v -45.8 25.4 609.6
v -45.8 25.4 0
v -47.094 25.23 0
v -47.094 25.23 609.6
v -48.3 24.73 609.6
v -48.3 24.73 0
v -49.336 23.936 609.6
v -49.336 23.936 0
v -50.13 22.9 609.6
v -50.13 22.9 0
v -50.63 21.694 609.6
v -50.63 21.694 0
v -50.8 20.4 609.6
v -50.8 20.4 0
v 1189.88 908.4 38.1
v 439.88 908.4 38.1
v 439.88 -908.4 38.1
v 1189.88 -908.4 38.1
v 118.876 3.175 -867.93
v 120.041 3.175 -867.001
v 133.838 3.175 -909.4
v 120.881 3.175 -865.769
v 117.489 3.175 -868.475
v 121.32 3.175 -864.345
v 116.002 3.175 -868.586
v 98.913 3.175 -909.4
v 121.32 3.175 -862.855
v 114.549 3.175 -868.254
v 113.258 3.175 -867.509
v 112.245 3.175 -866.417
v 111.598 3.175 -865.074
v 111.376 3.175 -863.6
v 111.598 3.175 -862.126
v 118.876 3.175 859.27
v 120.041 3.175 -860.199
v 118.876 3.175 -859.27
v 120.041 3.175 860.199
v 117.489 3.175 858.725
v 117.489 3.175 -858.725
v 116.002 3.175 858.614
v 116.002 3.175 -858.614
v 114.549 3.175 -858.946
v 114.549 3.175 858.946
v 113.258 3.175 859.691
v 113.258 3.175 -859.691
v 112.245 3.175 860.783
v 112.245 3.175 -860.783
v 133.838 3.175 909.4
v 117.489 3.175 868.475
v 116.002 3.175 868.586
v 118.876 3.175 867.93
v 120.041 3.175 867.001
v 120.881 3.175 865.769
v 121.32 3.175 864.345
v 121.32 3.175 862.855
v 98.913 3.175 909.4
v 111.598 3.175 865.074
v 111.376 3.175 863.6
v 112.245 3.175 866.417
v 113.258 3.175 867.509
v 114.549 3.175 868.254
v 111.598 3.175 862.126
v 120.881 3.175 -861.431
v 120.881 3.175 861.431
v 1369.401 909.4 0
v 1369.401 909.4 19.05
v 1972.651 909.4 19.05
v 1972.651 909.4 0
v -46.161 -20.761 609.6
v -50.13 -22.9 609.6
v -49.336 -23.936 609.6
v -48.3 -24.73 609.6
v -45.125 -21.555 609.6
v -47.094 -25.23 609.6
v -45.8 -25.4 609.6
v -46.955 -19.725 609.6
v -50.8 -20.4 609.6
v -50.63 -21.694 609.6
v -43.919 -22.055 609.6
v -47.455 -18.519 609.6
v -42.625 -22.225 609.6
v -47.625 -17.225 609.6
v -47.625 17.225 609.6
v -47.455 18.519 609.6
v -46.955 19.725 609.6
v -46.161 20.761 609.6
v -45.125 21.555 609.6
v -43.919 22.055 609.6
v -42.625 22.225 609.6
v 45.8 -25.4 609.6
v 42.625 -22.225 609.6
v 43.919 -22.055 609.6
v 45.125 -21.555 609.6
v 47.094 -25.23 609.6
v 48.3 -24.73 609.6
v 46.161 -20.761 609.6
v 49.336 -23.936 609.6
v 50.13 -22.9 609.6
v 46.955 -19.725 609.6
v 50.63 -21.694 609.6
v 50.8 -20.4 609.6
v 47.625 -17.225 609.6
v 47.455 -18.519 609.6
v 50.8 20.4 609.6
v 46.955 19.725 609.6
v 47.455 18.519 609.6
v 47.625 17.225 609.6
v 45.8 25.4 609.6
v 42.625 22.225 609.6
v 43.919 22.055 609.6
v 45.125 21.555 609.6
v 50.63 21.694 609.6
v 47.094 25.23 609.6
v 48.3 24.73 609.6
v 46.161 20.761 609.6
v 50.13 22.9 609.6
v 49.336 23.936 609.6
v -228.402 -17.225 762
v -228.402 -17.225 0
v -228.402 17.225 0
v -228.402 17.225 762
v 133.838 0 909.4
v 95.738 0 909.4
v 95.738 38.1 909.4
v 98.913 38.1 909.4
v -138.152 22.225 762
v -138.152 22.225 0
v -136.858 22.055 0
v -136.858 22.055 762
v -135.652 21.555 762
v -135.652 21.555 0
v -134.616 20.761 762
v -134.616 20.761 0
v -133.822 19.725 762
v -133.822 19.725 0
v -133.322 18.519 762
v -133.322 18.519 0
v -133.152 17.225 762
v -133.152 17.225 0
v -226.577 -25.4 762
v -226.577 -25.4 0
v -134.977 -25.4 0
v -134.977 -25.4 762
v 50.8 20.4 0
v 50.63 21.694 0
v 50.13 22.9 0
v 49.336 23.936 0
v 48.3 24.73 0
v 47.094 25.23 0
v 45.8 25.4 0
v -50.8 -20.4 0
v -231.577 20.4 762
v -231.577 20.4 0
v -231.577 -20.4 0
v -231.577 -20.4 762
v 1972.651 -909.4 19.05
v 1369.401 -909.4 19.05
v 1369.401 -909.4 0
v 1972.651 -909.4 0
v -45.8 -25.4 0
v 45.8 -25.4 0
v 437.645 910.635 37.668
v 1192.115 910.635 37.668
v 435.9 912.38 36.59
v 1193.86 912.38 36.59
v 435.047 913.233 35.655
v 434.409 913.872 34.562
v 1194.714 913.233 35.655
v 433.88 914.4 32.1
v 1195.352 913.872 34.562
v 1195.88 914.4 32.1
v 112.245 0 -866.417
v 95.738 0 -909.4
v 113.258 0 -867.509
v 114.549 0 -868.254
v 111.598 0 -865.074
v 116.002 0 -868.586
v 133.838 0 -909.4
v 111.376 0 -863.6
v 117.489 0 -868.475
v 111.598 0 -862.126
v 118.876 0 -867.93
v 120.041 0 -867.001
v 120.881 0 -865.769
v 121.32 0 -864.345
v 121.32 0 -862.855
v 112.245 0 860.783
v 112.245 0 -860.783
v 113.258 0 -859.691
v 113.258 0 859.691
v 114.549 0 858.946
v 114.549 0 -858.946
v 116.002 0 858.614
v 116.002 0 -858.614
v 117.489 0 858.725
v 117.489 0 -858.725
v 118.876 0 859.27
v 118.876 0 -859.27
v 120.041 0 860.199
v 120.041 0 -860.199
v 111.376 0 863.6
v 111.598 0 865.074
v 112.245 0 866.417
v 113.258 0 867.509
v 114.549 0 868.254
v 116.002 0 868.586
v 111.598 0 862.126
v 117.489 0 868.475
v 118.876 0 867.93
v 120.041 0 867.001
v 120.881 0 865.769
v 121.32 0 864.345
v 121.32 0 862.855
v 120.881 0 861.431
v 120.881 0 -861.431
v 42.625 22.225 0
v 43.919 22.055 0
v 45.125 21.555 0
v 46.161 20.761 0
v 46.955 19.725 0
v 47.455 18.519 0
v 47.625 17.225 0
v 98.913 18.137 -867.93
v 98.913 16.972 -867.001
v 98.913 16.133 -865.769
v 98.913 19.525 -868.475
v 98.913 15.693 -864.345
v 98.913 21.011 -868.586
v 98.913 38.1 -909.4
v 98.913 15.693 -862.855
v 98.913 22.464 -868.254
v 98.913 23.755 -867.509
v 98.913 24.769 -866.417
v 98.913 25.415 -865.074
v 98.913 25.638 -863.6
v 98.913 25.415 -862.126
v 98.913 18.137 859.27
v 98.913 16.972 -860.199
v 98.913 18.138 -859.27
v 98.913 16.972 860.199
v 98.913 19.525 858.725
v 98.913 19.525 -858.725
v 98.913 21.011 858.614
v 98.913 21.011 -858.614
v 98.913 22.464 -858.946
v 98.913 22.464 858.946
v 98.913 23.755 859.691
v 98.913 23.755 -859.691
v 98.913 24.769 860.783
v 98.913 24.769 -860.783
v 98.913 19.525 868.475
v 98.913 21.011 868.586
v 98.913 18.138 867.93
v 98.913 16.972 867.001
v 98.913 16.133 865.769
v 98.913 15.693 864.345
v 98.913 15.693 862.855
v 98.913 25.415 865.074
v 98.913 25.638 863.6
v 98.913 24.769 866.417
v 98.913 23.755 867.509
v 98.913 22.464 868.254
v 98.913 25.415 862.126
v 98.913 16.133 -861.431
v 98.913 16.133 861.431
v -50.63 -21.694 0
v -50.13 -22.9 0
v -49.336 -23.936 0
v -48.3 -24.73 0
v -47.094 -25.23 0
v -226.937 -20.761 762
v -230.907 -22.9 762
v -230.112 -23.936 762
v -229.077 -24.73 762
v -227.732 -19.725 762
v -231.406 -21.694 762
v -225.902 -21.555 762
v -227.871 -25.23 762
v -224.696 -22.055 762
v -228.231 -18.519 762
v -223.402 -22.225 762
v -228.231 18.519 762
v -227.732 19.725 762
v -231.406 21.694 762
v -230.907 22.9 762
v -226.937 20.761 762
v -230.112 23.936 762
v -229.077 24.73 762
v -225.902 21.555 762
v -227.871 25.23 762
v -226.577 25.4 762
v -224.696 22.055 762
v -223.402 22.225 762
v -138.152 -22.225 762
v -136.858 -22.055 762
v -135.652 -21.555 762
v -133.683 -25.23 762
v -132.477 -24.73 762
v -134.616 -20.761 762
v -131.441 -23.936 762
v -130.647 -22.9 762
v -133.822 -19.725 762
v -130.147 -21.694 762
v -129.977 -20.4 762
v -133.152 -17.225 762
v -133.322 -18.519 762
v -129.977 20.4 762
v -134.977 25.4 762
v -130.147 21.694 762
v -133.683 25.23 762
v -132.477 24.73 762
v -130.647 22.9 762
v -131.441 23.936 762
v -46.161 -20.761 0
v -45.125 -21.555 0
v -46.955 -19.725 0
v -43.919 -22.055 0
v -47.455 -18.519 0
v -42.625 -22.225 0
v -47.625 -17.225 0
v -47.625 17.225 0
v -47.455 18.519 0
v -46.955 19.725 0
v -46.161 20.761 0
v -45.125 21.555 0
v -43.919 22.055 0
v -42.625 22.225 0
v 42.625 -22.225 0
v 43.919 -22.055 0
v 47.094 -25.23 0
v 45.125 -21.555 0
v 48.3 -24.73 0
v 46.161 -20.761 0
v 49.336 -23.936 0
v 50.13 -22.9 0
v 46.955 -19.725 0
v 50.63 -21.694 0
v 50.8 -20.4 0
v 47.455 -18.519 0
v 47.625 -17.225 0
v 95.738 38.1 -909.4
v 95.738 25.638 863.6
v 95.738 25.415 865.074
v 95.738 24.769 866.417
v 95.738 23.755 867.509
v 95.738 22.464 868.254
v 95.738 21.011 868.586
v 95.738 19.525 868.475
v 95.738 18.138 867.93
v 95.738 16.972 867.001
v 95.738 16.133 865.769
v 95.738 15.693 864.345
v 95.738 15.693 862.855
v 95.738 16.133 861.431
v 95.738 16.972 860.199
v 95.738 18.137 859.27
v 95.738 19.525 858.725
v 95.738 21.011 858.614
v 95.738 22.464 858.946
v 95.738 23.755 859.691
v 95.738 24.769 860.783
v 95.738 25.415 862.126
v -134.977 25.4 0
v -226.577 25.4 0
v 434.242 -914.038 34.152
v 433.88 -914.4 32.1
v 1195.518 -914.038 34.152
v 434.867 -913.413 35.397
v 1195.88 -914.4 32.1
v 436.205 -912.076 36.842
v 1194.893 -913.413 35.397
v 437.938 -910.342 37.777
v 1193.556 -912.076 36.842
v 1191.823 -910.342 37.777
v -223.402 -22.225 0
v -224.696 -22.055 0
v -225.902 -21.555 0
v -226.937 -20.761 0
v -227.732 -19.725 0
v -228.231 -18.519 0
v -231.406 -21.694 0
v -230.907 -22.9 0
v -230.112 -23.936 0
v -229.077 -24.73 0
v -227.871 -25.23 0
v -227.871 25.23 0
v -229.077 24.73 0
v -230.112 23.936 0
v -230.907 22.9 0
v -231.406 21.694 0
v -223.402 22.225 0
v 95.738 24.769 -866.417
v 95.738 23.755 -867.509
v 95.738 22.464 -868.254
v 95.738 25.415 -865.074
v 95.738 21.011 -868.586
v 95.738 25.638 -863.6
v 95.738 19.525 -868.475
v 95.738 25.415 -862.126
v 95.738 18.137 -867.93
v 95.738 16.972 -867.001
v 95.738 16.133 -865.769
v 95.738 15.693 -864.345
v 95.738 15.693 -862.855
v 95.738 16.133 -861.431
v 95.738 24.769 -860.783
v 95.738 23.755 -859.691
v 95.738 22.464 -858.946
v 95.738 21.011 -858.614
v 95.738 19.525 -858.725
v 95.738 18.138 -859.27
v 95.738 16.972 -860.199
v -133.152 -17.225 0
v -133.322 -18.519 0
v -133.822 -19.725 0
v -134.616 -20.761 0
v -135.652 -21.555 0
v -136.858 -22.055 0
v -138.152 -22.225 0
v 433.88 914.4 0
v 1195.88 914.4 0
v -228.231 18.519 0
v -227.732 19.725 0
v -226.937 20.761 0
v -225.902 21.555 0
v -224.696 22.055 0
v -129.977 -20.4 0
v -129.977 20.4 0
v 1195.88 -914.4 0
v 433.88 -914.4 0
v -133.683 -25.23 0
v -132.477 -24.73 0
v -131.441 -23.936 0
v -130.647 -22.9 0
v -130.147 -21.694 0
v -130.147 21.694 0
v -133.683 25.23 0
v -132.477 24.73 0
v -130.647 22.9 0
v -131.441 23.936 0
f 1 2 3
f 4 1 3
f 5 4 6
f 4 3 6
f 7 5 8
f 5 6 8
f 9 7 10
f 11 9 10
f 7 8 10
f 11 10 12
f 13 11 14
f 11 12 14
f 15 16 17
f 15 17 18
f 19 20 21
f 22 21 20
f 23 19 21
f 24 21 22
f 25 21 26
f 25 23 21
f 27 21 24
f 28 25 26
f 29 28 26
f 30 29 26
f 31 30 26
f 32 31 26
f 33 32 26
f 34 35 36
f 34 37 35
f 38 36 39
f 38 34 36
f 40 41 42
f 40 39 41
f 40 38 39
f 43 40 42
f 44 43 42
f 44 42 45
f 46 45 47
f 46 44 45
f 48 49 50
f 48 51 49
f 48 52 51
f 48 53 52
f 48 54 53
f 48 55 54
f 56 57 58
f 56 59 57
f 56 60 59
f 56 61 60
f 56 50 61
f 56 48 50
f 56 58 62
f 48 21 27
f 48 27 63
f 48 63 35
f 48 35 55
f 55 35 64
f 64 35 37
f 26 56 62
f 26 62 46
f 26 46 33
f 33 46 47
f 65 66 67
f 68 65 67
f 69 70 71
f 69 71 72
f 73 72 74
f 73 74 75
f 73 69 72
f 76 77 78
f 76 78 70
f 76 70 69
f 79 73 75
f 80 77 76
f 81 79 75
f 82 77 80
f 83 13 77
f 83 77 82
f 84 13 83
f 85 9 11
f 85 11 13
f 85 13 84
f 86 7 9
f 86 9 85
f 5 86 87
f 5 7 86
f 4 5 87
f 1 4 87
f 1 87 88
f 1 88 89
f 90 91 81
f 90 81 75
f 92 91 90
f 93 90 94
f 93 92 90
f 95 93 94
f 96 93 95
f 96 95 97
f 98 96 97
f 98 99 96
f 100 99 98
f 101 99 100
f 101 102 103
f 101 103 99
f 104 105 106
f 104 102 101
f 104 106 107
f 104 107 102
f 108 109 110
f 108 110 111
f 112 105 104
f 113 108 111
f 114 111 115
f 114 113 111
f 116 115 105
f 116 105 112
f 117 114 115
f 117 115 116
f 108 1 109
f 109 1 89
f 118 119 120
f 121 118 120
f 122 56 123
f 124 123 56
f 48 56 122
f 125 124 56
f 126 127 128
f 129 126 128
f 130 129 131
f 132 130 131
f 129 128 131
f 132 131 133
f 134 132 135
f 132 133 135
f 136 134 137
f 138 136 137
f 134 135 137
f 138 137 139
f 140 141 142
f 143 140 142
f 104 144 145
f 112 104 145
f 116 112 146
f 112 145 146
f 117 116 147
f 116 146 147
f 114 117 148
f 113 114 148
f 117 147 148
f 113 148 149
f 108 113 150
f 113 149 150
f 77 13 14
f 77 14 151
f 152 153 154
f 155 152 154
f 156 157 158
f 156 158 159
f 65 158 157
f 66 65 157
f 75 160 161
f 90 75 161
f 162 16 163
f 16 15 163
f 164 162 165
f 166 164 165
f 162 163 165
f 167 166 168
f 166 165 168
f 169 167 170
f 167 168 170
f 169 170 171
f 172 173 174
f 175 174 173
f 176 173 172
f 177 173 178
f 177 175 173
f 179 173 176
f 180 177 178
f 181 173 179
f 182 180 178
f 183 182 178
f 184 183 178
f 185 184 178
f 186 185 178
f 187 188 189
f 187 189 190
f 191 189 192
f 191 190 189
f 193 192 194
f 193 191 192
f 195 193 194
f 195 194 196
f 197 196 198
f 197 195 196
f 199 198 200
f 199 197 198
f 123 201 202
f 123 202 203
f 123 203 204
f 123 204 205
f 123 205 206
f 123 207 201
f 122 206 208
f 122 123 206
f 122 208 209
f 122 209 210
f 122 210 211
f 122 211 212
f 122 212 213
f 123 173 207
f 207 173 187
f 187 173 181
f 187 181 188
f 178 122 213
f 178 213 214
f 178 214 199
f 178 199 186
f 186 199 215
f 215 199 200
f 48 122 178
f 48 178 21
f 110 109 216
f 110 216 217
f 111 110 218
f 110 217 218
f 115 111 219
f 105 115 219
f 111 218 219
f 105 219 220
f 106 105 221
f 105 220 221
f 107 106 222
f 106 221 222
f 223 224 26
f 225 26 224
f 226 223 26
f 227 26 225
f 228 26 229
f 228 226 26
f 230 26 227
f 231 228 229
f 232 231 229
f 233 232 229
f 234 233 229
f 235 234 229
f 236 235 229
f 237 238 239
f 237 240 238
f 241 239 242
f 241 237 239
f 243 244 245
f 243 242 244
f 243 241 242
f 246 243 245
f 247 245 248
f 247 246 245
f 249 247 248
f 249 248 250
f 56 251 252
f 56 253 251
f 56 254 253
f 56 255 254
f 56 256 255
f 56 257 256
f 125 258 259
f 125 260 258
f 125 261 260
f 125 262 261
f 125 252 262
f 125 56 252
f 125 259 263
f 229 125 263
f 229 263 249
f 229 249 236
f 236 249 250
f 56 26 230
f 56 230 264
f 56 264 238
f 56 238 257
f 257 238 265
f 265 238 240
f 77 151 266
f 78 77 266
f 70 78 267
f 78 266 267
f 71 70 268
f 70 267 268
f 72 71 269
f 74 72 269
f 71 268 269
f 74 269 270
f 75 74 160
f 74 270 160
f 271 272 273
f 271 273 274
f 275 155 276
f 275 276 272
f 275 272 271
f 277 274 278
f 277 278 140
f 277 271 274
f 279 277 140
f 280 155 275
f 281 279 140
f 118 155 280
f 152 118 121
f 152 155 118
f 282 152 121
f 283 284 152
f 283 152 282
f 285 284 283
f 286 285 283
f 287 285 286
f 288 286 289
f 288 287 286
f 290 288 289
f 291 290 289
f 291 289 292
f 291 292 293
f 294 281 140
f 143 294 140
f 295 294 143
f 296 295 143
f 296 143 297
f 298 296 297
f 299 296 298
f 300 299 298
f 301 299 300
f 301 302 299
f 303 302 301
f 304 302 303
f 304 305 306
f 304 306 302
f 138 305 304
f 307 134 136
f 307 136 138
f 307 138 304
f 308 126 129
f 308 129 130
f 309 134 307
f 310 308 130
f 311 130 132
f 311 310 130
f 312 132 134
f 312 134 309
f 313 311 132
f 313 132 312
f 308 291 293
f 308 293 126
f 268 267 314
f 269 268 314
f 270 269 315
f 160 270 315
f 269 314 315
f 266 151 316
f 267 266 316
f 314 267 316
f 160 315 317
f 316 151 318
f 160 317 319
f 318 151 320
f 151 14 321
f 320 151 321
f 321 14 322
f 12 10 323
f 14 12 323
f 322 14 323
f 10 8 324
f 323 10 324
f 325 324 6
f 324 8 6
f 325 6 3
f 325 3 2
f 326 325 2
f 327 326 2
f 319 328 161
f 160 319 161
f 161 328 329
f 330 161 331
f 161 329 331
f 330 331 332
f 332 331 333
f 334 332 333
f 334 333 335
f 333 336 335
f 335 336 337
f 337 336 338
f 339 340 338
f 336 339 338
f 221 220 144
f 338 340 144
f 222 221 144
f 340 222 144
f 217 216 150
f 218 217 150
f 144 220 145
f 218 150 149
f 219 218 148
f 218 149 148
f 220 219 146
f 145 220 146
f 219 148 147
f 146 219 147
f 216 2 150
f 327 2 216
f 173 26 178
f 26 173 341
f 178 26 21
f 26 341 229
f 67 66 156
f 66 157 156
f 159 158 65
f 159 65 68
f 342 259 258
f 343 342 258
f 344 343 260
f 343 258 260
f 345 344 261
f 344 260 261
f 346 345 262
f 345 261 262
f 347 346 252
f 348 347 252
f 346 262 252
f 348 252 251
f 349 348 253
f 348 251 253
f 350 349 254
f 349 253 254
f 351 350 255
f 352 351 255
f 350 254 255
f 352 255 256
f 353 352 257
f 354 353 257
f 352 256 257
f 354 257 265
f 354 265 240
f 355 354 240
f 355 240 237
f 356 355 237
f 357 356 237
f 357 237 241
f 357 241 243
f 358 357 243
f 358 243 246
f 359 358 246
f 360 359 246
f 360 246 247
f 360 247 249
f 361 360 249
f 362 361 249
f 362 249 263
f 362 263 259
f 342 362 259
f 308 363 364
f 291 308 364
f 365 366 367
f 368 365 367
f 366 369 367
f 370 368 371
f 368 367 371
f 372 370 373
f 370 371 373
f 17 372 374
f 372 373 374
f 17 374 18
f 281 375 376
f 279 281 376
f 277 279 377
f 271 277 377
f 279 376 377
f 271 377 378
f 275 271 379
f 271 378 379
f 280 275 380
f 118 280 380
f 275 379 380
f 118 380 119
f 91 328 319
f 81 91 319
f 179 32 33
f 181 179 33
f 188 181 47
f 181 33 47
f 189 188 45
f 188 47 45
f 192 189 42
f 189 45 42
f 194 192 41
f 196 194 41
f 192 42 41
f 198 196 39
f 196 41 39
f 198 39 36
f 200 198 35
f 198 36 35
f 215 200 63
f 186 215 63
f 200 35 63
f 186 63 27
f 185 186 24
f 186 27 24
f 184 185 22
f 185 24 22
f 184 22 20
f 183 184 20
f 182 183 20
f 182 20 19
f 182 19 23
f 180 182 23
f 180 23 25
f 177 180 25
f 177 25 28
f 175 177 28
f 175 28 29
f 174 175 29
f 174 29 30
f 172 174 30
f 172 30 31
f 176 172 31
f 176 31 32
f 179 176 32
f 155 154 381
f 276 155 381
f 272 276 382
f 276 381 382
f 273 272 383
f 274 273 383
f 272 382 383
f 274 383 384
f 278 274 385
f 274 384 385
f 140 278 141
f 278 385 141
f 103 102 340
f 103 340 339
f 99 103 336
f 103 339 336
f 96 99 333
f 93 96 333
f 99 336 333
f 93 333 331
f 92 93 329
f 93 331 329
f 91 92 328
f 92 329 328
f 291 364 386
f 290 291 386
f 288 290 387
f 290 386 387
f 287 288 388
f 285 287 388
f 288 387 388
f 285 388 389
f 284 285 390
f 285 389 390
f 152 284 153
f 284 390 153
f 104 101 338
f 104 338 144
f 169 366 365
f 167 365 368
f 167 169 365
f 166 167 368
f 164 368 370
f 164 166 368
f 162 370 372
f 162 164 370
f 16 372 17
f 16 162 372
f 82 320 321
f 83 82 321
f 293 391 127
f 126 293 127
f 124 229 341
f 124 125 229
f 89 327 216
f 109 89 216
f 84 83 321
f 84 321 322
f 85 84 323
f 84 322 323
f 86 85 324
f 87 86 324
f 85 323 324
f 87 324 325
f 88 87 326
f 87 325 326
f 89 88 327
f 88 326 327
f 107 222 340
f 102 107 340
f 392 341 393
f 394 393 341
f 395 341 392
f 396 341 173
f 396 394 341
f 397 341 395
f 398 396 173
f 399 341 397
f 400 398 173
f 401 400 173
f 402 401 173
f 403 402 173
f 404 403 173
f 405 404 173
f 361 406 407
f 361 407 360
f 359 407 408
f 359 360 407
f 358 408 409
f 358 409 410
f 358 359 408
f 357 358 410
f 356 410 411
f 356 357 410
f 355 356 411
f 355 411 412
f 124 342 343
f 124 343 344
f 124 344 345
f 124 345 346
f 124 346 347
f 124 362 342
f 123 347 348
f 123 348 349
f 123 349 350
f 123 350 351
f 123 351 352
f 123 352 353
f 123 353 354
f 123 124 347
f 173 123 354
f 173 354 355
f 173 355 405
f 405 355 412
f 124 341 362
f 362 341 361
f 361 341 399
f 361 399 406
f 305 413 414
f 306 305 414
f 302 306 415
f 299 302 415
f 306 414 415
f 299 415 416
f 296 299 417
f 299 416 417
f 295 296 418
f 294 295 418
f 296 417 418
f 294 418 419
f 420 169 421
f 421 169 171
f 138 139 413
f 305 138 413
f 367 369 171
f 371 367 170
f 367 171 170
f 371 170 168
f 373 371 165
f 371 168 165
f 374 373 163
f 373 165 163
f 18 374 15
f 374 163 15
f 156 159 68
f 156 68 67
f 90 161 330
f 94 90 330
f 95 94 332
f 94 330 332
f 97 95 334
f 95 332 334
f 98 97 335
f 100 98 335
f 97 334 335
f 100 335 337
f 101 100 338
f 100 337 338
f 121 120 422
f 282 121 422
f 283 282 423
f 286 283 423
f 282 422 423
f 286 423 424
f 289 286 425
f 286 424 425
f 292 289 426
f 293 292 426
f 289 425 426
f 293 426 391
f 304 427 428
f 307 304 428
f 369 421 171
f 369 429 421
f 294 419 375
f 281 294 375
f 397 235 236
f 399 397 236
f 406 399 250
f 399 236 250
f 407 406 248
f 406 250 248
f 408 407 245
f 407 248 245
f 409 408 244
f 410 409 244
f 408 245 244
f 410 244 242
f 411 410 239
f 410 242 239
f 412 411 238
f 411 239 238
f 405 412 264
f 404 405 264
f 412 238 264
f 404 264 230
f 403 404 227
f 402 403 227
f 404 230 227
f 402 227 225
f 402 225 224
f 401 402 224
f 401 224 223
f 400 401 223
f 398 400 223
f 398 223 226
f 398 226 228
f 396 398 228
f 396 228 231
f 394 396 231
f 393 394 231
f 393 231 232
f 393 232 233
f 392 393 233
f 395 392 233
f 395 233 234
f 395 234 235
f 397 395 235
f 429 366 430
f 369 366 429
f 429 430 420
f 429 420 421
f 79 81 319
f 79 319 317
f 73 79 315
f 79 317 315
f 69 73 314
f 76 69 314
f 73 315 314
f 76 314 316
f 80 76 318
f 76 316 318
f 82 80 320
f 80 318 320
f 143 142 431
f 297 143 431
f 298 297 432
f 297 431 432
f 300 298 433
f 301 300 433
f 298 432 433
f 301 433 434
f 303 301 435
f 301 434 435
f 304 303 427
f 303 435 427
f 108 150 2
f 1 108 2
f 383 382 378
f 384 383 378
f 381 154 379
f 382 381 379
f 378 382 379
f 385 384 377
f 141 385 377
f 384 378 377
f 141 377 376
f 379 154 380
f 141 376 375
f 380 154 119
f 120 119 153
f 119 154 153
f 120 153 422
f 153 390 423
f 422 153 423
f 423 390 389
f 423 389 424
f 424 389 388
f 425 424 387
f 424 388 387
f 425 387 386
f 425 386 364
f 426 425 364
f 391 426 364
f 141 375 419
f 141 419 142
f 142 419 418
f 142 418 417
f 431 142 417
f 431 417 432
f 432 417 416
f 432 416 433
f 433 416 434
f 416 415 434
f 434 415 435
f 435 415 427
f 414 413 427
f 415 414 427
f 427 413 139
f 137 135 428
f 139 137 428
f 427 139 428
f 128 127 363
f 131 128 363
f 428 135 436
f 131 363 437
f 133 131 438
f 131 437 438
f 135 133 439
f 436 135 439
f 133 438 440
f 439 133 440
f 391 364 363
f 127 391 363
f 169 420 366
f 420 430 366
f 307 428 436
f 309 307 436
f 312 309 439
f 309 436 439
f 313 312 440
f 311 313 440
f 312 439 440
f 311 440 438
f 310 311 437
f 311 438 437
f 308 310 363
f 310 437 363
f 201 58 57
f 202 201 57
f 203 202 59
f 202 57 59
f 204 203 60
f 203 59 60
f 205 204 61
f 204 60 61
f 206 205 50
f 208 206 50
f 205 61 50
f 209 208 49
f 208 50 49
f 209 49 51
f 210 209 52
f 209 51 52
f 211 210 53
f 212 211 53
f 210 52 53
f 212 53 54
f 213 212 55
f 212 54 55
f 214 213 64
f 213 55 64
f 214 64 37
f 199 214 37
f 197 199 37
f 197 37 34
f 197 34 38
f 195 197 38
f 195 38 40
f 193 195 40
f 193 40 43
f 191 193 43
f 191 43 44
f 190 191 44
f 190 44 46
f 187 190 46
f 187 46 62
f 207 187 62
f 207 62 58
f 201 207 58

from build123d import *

# Parameters (mm, degrees)
F1_DEPTH  = 762
F3_DEPTH  = 609.6
F5_DEPTH  = 909.4
F6_W      = 762
F6_H      = 38.1
F7_DEPTH  = 914.4
F8_R      = 6
F10_R     = 5
F11_DEPTH = 330.4912731061
F12_R     = 5
F13_DEPTH = 917.576
F9_W      = 603.25
F9_H      = 19.05
F14_DEPTH = 909.4


with BuildPart() as f1:
    # F0 (on Top) → F1 (new body)
    with BuildSketch(Plane.XY):
        with BuildLine():
            ThreePointArc((-129.9768344879, 20.4), (-131.441300582, 23.9355339059), (-134.9768344879, 25.4))
            Line((-134.9768344879, 25.4), (-226.5768344879, 25.4))
            ThreePointArc((-226.5768344879, 25.4), (-230.1123683938, 23.9355339059), (-231.5768344879, 20.4))
            Line((-231.5768344879, 20.4), (-231.5768344879, -20.4))
            ThreePointArc((-231.5768344879, -20.4), (-230.1123683938, -23.9355339059), (-226.5768344879, -25.4))
            Line((-226.5768344879, -25.4), (-134.9768344879, -25.4))
            ThreePointArc((-134.9768344879, -25.4), (-131.441300582, -23.9355339059), (-129.9768344879, -20.4))
            Line((-129.9768344879, -20.4), (-129.9768344879, 20.4))
        make_face()
        with BuildLine():
            Line((-223.4018344879, 22.225), (-138.1518344879, 22.225))
            ThreePointArc((-138.1518344879, 22.225), (-134.616300582, 20.7605339059), (-133.1518344879, 17.225))
            Line((-133.1518344879, 17.225), (-133.1518344879, -17.225))
            ThreePointArc((-133.1518344879, -17.225), (-134.616300582, -20.7605339059), (-138.1518344879, -22.225))
            Line((-138.1518344879, -22.225), (-223.4018344879, -22.225))
            ThreePointArc((-223.4018344879, -22.225), (-226.9373683938, -20.7605339059), (-228.4018344879, -17.225))
            Line((-228.4018344879, -17.225), (-228.4018344879, 17.225))
            ThreePointArc((-228.4018344879, 17.225), (-226.9373683938, 20.7605339059), (-223.4018344879, 22.225))
        make_face(mode=Mode.SUBTRACT)
    extrude(amount=F1_DEPTH)


with BuildPart() as f3:
    # F2 (on Top) → F3 (new body)
    with BuildSketch(Plane.XY):
        with BuildLine():
            ThreePointArc((50.8, 20.4), (49.3355339059, 23.9355339059), (45.8, 25.4))
            Line((45.8, 25.4), (-45.8, 25.4))
            ThreePointArc((-45.8, 25.4), (-49.3355339059, 23.9355339059), (-50.8, 20.4))
            Line((-50.8, 20.4), (-50.8, -20.4))
            ThreePointArc((-50.8, -20.4), (-49.3355339059, -23.9355339059), (-45.8, -25.4))
            Line((-45.8, -25.4), (45.8, -25.4))
            ThreePointArc((45.8, -25.4), (49.3355339059, -23.9355339059), (50.8, -20.4))
            Line((50.8, -20.4), (50.8, 20.4))
        make_face()
        with BuildLine():
            Line((-42.625, 22.225), (42.625, 22.225))
            ThreePointArc((42.625, 22.225), (46.1605339059, 20.7605339059), (47.625, 17.225))
            Line((47.625, 17.225), (47.625, -17.225))
            ThreePointArc((47.625, -17.225), (46.1605339059, -20.7605339059), (42.625, -22.225))
            Line((42.625, -22.225), (-42.625, -22.225))
            ThreePointArc((-42.625, -22.225), (-46.1605339059, -20.7605339059), (-47.625, -17.225))
            Line((-47.625, -17.225), (-47.625, 17.225))
            ThreePointArc((-47.625, 17.225), (-46.1605339059, 20.7605339059), (-42.625, 22.225))
        make_face(mode=Mode.SUBTRACT)
    extrude(amount=F3_DEPTH)


with BuildPart() as f5:
    # F4 (on Top) → F5 (new body, symmetric)
    with BuildSketch(Plane.XY):
        Polygon((95.7384386182, 38.1), (95.7384386182, 0), (133.8384386182, 0), (133.8384386182, 3.175), (98.9134386182, 3.175), (98.9134386182, 38.1), align=None)
    extrude(amount=F5_DEPTH, both=True)

    # F10 (on face) → F11 (cut, through all)
    with BuildSketch(Plane.YZ.offset(98.9134386182)):
        with Locations((20.6375, 863.6)):
            Circle(F10_R)
        with Locations((20.6375, -863.6)):
            Circle(F10_R)
    extrude(amount=-F11_DEPTH, mode=Mode.SUBTRACT)

    # F12 (on face) → F13 (cut, through all)
    with BuildSketch(Plane(origin=(0, 3.175, 0), x_dir=(-1, 0, 0), z_dir=(0, 1, 0))):
        with Locations((-116.3759386182, 863.6)):
            Circle(F12_R)
        with Locations((-116.3759386182, -863.6)):
            Circle(F12_R)
    extrude(amount=-F13_DEPTH, mode=Mode.SUBTRACT)


with BuildPart() as f7:
    # F6 (on Front) → F7 (new body, symmetric)
    with BuildSketch(Plane.XZ):
        with Locations((814.880300072, 19.05)):
            Rectangle(F6_W, F6_H)
    extrude(amount=F7_DEPTH, both=True)

    # F8
    f8_edges = [f7.edges().sort_by_distance(p)[0] for p in [
        (814.8803, 914.4, 38.1),
        (433.8803, 0, 38.1),
        (814.8803, -914.4, 38.1),
        (1195.8803, 0, 38.1),
    ]]
    fillet(f8_edges, radius=F8_R)


with BuildPart() as f14:
    # F9 (on Front) → F14 (new body, symmetric)
    with BuildSketch(Plane.XZ):
        with Locations((1671.0256204605, 9.525)):
            Rectangle(F9_W, F9_H)
    extrude(amount=F14_DEPTH, both=True)


solid = Compound([f1.part, f3.part, f5.part, f7.part, f14.part])
